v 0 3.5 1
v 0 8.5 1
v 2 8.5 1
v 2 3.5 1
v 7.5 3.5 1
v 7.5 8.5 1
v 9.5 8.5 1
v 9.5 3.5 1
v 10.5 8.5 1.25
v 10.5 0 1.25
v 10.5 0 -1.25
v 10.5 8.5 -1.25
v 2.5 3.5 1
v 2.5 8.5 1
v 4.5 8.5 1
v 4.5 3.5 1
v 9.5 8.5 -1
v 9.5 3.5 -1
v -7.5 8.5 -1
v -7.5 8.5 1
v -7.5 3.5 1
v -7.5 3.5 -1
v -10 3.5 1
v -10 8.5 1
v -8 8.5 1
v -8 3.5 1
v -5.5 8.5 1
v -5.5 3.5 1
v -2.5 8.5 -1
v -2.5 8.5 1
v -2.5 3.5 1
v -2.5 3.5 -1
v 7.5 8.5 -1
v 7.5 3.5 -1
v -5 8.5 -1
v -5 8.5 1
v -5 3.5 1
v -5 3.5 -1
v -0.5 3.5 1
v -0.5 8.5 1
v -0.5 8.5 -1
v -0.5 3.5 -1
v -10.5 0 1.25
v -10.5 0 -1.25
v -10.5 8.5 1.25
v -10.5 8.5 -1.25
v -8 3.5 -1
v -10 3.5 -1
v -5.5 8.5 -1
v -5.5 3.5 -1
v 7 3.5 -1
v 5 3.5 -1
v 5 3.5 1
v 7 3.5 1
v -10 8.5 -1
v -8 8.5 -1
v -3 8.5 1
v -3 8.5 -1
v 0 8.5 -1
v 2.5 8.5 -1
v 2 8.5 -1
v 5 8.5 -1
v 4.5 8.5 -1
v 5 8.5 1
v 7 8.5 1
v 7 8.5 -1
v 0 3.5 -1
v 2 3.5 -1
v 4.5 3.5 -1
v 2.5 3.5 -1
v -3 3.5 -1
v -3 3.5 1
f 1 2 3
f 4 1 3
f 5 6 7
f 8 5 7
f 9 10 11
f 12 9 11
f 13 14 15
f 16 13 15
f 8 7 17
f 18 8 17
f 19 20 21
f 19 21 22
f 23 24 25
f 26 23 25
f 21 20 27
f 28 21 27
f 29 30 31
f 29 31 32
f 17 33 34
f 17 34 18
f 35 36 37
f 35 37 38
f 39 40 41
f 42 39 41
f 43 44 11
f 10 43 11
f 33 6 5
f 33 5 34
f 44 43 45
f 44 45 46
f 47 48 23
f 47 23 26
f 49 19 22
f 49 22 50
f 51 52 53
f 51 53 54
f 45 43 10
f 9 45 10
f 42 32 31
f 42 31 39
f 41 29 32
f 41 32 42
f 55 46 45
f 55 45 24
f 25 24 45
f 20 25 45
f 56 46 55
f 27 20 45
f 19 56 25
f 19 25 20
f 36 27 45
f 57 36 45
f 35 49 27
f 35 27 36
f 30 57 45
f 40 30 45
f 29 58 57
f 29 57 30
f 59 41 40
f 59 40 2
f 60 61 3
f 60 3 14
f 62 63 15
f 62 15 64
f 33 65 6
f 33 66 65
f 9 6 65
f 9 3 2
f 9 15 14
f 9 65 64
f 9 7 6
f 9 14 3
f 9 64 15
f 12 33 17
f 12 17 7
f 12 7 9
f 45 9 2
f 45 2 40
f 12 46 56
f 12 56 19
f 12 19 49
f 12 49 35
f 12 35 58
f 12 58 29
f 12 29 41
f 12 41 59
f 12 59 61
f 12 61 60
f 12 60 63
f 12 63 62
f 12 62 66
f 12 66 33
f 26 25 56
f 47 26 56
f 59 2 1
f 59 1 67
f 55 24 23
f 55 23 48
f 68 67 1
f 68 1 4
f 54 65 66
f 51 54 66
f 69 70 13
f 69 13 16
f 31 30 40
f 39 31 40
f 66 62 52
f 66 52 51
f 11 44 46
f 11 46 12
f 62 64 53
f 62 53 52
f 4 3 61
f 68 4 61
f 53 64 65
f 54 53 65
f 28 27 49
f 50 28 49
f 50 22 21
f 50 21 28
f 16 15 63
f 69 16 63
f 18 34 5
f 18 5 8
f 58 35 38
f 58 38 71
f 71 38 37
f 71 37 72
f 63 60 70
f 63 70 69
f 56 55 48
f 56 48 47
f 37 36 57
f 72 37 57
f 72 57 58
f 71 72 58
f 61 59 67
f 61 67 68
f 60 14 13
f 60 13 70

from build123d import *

# Parameters (mm, degrees)
SKETCH1_W           = 21
SKETCH1_H           = 2.5
BOSS_EXTRUDE1_DEPTH = 8.5
SKETCH2_W           = 2
SKETCH2_H           = 2
CUT_EXTRUDE1_DEPTH  = 5


with BuildPart() as part:
    # Sketch1 → Boss-Extrude1 (new body)
    with BuildSketch(Plane(origin=(0, 0, 0), x_dir=(1, 0, 0), z_dir=(0, 1, 0))):
        Rectangle(SKETCH1_W, SKETCH1_H)
    extrude(amount=BOSS_EXTRUDE1_DEPTH)

    # Sketch2 → Cut-Extrude1 (cut)
    with BuildSketch(Plane(origin=(0, 8.5, 0), x_dir=(1, 0, 0), z_dir=(0, 1, 0))):
        with Locations((-6.5, 0)):
            Rectangle(SKETCH2_W, SKETCH2_H)
        with Locations((-9, 0)):
            Rectangle(SKETCH2_W, SKETCH2_H)
        with Locations((-4, 0)):
            Rectangle(SKETCH2_W, SKETCH2_H)
        with Locations((-1.5, 0)):
            Rectangle(SKETCH2_W, SKETCH2_H)
        with Locations((1, 0)):
            Rectangle(SKETCH2_W, SKETCH2_H)
        with Locations((3.5, 0)):
            Rectangle(SKETCH2_W, SKETCH2_H)
        with Locations((6, 0)):
            Rectangle(SKETCH2_W, SKETCH2_H)
        with Locations((8.5, 0)):
            Rectangle(SKETCH2_W, SKETCH2_H)
    extrude(amount=-CUT_EXTRUDE1_DEPTH, mode=Mode.SUBTRACT)


solid = part.part
